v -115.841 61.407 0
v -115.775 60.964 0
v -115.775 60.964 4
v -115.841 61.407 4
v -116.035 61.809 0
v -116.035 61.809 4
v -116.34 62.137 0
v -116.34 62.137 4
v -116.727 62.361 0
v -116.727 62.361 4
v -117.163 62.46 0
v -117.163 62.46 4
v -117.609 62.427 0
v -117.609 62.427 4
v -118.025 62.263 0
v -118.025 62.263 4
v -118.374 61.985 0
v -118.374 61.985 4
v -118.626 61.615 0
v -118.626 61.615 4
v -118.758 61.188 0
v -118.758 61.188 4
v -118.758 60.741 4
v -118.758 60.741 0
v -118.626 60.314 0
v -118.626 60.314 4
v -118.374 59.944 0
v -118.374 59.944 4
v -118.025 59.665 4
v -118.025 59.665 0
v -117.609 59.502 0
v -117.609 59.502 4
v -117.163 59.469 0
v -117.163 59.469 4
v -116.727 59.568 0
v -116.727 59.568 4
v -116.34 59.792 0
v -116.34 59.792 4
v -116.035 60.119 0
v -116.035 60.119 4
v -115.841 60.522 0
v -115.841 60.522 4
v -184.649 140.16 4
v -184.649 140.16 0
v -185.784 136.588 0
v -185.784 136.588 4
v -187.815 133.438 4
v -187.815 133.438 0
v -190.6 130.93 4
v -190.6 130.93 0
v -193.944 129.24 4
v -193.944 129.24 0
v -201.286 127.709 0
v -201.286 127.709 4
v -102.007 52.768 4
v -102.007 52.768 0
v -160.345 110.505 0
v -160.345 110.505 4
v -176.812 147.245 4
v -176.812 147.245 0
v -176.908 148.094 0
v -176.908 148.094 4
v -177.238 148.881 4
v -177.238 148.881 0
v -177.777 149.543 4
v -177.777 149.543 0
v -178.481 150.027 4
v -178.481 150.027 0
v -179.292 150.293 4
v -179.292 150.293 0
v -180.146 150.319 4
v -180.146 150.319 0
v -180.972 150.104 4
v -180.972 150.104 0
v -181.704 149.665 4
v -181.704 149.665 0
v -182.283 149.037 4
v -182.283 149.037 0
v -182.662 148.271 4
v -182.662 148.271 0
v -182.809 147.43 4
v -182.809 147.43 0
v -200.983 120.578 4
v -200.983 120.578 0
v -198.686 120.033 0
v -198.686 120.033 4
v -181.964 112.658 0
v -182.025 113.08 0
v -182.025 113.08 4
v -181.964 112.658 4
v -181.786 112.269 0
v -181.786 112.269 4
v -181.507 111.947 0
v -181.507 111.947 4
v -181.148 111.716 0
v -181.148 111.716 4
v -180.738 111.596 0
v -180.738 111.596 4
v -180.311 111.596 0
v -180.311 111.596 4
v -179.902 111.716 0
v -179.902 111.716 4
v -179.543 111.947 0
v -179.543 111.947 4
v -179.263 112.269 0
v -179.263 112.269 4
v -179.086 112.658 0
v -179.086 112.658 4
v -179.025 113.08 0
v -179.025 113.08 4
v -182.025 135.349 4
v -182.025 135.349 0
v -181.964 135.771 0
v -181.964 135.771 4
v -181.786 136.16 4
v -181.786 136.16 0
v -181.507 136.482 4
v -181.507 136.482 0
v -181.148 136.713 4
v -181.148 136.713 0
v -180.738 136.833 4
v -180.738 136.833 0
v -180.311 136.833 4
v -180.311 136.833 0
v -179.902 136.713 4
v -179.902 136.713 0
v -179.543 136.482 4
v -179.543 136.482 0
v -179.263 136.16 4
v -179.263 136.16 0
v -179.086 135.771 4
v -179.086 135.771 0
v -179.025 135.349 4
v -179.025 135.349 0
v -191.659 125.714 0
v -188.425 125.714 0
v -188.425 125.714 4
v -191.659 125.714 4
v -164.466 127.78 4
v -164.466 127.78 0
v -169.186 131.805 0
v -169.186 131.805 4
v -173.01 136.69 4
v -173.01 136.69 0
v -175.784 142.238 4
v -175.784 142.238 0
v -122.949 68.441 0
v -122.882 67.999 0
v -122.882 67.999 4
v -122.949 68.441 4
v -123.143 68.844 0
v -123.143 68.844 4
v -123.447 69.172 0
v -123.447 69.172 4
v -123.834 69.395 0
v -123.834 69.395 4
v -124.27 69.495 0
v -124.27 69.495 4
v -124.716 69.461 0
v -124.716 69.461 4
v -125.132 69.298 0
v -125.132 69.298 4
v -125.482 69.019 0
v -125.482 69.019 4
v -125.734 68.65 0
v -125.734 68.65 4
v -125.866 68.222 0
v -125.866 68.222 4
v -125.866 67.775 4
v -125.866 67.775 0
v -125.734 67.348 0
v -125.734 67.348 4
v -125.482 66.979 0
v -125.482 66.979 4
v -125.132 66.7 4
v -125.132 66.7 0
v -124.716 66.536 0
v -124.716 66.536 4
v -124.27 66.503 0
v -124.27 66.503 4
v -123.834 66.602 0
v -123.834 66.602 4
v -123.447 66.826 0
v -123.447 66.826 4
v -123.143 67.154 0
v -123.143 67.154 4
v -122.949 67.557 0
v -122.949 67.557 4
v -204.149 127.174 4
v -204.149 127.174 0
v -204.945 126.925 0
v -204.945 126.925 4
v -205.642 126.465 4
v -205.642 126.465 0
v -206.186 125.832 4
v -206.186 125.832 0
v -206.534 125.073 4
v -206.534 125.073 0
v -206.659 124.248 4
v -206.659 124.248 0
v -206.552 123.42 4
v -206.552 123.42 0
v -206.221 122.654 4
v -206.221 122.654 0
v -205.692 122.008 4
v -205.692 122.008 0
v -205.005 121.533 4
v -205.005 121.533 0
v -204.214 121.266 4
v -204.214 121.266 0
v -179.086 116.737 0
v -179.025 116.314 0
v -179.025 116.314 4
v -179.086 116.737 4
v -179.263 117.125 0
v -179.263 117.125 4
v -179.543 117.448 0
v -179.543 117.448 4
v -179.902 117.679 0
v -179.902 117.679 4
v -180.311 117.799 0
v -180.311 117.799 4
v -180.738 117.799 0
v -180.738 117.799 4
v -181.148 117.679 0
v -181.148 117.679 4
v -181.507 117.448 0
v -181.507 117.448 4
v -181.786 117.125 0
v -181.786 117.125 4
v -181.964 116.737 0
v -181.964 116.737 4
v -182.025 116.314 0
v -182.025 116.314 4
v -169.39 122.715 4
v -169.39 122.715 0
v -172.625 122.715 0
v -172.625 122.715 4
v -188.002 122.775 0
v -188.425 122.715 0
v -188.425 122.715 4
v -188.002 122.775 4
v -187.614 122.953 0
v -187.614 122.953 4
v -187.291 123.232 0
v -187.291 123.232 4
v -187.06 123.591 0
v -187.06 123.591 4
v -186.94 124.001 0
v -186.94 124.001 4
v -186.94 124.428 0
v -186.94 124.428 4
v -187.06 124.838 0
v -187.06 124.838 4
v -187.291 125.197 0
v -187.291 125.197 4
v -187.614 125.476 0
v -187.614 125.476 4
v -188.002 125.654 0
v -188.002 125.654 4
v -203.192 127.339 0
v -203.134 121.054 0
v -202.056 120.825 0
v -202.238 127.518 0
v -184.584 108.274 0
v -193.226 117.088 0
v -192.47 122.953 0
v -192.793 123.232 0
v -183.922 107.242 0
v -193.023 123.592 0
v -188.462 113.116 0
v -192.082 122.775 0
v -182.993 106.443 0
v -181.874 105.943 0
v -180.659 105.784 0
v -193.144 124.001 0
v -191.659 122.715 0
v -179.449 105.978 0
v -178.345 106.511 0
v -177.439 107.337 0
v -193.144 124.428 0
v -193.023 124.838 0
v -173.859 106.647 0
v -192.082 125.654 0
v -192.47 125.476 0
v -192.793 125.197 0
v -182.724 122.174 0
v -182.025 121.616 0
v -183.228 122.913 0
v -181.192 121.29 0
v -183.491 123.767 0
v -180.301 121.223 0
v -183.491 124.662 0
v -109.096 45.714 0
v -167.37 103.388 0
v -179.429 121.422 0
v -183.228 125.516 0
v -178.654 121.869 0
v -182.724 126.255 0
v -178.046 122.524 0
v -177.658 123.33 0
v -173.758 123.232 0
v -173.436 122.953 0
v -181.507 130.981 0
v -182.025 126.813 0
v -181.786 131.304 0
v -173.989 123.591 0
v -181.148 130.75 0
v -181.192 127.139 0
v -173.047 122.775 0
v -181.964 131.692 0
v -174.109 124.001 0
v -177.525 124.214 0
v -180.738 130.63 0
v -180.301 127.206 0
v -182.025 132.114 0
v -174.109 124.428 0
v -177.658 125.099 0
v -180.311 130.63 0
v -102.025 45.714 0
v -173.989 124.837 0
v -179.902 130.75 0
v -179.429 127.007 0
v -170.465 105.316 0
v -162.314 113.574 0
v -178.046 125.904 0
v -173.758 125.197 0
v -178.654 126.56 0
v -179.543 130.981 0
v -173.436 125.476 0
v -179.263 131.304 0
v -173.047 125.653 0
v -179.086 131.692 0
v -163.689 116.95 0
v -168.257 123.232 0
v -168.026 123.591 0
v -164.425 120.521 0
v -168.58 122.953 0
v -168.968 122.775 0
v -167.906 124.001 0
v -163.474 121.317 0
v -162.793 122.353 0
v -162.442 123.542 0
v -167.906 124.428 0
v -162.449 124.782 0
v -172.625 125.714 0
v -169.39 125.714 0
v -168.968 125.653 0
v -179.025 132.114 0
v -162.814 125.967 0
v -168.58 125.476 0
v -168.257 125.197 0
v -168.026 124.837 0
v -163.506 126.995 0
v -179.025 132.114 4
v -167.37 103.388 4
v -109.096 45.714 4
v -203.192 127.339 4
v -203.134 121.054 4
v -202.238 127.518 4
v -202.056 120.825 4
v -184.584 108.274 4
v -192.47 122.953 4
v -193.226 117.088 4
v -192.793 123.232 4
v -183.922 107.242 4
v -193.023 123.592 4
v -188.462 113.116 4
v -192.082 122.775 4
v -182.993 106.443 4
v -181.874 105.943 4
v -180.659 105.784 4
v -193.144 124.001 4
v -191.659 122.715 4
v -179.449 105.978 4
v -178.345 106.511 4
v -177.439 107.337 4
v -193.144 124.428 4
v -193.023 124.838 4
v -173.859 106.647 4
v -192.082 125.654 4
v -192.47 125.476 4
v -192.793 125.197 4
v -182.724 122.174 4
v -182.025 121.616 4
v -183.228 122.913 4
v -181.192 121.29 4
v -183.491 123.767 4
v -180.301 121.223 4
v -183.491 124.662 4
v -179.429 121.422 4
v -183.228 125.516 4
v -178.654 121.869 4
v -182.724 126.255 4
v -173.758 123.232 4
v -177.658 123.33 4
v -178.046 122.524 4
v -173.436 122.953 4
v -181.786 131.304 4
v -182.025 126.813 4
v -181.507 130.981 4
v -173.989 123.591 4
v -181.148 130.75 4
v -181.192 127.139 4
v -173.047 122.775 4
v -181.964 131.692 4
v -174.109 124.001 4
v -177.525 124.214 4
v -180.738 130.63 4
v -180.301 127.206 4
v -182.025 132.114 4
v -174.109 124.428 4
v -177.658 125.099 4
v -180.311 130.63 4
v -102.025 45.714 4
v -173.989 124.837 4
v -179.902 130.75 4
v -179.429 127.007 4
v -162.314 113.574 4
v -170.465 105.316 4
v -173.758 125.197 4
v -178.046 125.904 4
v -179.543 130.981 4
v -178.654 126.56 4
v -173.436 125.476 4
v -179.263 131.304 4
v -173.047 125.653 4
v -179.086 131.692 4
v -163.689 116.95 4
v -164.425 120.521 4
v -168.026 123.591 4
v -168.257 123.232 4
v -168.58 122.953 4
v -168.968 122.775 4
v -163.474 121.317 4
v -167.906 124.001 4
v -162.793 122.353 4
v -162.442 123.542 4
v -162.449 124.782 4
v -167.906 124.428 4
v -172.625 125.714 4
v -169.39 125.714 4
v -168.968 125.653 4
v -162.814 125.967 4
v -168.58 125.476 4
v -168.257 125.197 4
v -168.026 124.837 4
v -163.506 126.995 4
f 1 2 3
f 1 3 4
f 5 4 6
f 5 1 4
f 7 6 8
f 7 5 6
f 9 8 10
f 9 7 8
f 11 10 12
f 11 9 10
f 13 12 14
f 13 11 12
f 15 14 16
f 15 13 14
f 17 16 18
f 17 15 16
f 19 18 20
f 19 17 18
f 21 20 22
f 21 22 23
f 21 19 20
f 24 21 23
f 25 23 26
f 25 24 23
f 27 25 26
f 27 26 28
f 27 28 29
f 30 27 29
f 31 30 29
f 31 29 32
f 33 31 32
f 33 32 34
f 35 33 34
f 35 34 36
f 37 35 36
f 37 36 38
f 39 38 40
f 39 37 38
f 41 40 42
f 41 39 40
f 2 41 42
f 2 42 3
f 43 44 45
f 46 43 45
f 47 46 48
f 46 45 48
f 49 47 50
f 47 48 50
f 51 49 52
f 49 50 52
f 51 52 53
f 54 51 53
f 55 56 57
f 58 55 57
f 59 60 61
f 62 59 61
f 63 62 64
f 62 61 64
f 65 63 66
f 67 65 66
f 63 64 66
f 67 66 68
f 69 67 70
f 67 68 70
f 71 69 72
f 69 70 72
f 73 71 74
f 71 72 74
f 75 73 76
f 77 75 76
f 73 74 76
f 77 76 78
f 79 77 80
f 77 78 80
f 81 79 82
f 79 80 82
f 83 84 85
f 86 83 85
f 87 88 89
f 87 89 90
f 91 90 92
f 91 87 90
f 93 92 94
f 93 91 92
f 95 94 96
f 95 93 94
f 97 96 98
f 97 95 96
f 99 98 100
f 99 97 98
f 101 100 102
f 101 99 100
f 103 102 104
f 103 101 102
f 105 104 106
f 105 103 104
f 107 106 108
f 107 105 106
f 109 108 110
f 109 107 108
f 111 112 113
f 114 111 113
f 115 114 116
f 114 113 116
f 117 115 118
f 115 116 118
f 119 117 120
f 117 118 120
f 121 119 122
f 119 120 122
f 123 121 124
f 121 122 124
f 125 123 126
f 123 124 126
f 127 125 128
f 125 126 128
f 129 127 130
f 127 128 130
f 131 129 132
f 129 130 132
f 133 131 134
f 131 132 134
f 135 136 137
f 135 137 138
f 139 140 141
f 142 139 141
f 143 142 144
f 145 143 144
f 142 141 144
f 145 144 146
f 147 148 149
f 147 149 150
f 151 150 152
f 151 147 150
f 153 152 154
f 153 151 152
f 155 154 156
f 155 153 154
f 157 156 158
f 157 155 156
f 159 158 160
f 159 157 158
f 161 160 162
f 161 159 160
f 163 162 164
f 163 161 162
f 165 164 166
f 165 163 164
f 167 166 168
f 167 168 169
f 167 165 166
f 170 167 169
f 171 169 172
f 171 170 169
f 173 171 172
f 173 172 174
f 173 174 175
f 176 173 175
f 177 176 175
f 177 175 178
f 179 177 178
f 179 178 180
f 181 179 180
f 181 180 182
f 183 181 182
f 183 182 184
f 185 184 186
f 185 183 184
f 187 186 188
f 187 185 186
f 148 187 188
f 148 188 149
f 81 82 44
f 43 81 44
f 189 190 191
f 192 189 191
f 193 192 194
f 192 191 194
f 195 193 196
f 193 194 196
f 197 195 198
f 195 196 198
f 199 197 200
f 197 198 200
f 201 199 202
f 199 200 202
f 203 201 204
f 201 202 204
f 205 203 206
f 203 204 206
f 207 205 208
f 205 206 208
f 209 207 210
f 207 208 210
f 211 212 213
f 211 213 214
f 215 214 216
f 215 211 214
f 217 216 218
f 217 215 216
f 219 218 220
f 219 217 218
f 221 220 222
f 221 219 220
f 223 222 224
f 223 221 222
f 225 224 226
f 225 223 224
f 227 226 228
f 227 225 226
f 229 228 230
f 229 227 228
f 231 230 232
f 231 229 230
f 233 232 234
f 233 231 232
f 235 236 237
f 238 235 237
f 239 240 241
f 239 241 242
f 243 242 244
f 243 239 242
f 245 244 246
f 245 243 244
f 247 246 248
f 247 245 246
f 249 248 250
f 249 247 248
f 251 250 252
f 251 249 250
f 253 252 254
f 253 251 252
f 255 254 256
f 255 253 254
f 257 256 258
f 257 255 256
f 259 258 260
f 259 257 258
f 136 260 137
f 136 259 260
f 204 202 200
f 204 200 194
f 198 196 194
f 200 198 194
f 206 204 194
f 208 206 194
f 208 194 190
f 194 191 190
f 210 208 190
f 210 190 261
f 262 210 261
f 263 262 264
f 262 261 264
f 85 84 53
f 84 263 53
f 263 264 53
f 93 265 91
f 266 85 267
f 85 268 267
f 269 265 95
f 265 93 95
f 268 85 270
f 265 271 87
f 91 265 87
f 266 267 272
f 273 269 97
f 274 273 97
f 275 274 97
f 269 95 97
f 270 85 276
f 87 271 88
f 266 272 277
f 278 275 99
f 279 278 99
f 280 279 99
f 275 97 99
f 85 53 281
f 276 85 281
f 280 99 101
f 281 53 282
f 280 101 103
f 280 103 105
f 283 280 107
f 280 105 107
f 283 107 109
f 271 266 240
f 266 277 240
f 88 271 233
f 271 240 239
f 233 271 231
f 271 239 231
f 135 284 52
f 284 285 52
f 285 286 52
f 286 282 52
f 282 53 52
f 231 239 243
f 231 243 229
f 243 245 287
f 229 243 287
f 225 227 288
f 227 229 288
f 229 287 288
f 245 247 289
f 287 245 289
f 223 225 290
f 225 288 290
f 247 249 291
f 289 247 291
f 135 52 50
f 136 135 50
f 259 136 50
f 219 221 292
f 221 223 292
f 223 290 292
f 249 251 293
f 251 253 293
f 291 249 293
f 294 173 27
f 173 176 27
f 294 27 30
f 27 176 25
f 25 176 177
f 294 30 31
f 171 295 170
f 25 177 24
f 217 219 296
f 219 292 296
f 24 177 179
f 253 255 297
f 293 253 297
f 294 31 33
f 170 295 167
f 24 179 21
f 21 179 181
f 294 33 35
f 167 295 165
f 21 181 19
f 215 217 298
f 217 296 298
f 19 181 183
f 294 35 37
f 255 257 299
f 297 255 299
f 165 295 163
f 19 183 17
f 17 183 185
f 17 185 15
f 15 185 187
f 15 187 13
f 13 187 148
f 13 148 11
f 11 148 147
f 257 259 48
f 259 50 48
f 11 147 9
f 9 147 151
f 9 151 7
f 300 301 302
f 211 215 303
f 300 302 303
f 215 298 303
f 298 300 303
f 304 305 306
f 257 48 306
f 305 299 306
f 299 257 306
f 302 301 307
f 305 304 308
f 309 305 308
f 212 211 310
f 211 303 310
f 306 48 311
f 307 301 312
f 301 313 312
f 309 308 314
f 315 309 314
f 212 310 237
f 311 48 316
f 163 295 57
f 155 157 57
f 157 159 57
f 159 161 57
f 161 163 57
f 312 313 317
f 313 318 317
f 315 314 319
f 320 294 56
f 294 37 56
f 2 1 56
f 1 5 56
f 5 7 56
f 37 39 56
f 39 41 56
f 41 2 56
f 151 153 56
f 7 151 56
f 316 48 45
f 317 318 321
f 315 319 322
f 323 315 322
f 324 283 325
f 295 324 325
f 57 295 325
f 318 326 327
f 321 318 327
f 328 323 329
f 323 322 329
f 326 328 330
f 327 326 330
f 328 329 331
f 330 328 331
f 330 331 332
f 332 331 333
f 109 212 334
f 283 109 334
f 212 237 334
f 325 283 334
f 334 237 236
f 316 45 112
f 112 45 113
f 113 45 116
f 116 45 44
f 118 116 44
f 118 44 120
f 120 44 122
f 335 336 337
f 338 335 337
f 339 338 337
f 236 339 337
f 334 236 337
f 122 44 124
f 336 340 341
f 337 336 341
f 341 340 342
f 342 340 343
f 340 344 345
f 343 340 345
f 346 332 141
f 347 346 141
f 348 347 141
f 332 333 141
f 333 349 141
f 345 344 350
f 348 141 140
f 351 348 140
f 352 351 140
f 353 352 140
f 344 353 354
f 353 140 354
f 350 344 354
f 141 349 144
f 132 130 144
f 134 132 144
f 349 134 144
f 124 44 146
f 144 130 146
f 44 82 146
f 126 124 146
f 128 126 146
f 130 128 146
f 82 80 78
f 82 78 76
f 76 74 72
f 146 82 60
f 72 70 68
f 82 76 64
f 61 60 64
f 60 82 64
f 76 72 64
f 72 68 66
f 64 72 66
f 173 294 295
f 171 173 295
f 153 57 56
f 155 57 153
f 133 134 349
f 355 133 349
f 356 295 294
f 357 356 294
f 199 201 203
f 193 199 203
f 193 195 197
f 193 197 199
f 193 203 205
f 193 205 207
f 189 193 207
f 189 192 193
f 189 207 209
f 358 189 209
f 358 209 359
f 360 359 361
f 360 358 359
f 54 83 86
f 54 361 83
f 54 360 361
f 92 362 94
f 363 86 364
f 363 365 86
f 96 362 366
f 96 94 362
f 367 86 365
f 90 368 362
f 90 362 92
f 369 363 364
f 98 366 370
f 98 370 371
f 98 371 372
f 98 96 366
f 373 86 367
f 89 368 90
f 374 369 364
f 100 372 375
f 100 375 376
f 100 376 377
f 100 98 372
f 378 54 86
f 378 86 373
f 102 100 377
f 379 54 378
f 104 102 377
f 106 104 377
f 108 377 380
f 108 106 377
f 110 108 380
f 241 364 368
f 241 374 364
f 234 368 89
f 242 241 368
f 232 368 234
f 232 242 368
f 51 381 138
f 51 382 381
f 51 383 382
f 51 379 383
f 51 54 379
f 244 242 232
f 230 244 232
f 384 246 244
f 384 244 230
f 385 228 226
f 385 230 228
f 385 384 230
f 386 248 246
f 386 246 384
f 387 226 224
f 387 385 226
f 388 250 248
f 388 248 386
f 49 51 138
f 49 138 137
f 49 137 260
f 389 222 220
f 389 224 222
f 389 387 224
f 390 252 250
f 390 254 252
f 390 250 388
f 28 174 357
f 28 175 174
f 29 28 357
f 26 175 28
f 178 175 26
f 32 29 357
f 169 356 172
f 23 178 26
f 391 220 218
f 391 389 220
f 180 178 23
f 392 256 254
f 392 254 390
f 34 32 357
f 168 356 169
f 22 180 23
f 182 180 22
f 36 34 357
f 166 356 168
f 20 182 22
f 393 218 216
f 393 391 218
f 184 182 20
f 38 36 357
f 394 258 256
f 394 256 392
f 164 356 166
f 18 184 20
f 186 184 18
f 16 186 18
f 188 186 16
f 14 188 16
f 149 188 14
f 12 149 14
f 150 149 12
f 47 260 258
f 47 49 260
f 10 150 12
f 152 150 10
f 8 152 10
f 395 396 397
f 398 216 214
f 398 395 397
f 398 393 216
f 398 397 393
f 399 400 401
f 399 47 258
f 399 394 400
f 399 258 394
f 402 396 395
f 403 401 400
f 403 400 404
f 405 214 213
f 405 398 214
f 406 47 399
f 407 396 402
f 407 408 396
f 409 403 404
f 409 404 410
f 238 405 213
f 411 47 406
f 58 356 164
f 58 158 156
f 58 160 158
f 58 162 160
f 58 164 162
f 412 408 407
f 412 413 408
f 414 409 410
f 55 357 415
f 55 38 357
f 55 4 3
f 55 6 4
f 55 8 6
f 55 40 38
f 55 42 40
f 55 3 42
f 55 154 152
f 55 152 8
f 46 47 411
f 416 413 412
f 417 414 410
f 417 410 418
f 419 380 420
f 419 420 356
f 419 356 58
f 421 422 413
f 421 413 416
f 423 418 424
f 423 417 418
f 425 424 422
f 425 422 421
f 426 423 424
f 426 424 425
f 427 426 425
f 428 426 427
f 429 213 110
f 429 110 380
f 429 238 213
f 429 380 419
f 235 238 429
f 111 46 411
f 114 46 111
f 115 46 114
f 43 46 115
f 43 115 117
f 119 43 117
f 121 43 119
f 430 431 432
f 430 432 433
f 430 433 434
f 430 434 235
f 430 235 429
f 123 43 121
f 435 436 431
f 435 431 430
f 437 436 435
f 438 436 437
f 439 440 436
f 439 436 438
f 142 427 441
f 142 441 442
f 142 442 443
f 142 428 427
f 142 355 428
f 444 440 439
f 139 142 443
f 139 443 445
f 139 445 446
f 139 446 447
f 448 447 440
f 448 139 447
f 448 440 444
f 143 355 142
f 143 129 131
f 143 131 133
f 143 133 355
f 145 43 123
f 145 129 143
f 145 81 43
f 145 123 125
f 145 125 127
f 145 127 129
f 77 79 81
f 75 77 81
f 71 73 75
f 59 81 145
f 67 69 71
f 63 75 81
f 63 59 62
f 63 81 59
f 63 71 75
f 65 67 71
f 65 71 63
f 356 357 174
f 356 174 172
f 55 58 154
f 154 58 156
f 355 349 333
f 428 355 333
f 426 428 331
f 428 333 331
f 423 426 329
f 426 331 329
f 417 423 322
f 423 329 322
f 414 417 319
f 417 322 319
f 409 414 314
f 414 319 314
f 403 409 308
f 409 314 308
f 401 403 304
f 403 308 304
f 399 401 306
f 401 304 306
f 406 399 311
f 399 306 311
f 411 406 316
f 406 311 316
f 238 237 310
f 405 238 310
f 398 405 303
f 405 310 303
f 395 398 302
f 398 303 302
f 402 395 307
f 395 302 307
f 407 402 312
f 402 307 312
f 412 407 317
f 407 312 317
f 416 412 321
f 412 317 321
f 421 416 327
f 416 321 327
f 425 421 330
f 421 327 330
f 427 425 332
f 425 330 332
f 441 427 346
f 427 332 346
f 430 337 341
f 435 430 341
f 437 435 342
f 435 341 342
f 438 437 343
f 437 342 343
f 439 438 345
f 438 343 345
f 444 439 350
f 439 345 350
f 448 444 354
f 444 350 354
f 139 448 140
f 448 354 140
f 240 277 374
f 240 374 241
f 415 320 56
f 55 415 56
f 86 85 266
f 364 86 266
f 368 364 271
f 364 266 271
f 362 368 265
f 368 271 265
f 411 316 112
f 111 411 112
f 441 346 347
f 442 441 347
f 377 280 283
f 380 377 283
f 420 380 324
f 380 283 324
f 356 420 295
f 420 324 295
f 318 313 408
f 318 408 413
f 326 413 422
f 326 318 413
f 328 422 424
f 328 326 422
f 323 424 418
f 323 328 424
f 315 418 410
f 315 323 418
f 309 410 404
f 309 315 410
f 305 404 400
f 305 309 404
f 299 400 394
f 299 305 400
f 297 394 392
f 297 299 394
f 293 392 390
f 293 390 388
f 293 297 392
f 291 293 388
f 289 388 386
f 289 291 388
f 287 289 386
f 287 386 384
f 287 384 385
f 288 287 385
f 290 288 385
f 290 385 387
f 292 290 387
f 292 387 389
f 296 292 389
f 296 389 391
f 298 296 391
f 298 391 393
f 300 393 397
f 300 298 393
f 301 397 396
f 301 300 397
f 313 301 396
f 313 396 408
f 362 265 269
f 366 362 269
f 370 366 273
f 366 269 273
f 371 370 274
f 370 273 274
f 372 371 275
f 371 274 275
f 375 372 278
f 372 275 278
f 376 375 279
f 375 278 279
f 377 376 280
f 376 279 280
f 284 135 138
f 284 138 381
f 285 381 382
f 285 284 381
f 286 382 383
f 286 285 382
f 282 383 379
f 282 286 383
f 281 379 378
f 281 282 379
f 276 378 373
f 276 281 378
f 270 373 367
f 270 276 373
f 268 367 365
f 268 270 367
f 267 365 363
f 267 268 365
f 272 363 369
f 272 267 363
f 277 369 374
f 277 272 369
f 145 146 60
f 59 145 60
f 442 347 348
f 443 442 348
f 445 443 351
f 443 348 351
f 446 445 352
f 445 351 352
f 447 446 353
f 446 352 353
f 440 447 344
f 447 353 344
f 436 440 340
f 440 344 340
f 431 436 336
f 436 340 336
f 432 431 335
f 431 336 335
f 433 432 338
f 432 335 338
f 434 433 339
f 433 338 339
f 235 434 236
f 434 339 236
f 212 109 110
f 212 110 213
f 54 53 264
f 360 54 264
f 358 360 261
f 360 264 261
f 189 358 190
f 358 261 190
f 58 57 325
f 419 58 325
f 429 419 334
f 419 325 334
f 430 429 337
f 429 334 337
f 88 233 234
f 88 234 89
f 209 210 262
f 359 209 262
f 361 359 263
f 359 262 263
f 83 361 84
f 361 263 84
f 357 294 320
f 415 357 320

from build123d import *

# Parameters (mm, degrees)
SKETCH1_R           = 1.5
SKETCH1_R_2         = 3
BOSS_EXTRUDE3_DEPTH = 4


with BuildPart() as part:
    # Sketch1 → Boss-Extrude3 (new body)
    with BuildSketch(Plane.XY):
        with BuildLine():
            Line((-200.98277671, 120.578395112), (-198.686273407, 120.032535791))
            ThreePointArc((-198.686273407, 120.032535791), (-190.744400987, 115.221467643), (-184.584385258, 108.273524028))
            ThreePointArc((-184.584385258, 108.273524028), (-181.272141891, 105.819229993), (-177.439106824, 107.336582128))
            ThreePointArc((-177.439106824, 107.336582128), (-172.13122346, 106.059599202), (-167.370398947, 103.387734467))
            Line((-167.370398947, 103.387734467), (-109.095690378, 45.714454225))
            Line((-109.095690378, 45.714454225), (-102.024771817, 45.714454225))
            Line((-102.024771817, 45.714454225), (-102.007026705, 52.767627674))
            Line((-102.007026705, 52.767627674), (-160.345422779, 110.504595422))
            ThreePointArc((-160.345422779, 110.504595422), (-163.078925024, 115.23029925), (-164.424771817, 120.521141112))
            ThreePointArc((-164.424771817, 120.521141112), (-162.39977496, 124.16226761), (-164.46612922, 127.780083873))
            ThreePointArc((-164.46612922, 127.780083873), (-171.220620663, 134.151626828), (-175.784254213, 142.238218389))
            Line((-175.784254213, 142.238218389), (-176.812194105, 147.245164825))
            ThreePointArc((-176.812194105, 147.245164825), (-179.718163472, 150.336336453), (-182.8093351, 147.430367085))
            Line((-182.8093351, 147.430367085), (-184.649305769, 140.159568784))
            ThreePointArc((-184.649305769, 140.159568784), (-187.814666362, 133.438140211), (-193.944387613, 129.240089815))
            Line((-193.944387613, 129.240089815), (-201.286490927, 127.709234194))
            ThreePointArc((-201.286490927, 127.709234194), (-202.714852362, 127.426883631), (-204.148777392, 127.174302472))
            ThreePointArc((-204.148777392, 127.174302472), (-206.658919771, 124.247833074), (-204.214354736, 121.266367045))
            ThreePointArc((-204.214354736, 121.266367045), (-202.594506126, 120.941450032), (-200.98277671, 120.578395112))
        make_face()
        with Locations((-117.274771817, 60.964454225)):
            Circle(SKETCH1_R, mode=Mode.SUBTRACT)
        with Locations((-180.524771817, 124.214454225)):
            Circle(SKETCH1_R_2, mode=Mode.SUBTRACT)
        with Locations((-124.382381975, 67.998789861)):
            Circle(SKETCH1_R, mode=Mode.SUBTRACT)
        with BuildLine():
            Line((-182.024547822, 132.114454225), (-182.024547822, 135.348786972))
            ThreePointArc((-182.024547822, 135.348786972), (-180.524727129, 136.848607665), (-179.024906436, 135.348786972))
            Line((-179.024906436, 135.348786972), (-179.024906436, 132.114454225))
            ThreePointArc((-179.024906436, 132.114454225), (-180.524727129, 130.614633532), (-182.024547822, 132.114454225))
        make_face(mode=Mode.SUBTRACT)
        with BuildLine():
            Line((-182.024547822, 116.314454225), (-182.024547822, 113.080121478))
            ThreePointArc((-182.024547822, 113.080121478), (-180.524727129, 111.580300785), (-179.024906436, 113.080121478))
            Line((-179.024906436, 113.080121478), (-179.024906436, 116.314454225))
            ThreePointArc((-179.024906436, 116.314454225), (-180.524727129, 117.814274918), (-182.024547822, 116.314454225))
        make_face(mode=Mode.SUBTRACT)
        with BuildLine():
            Line((-172.624771818, 125.71423023), (-169.39043907, 125.71423023))
            ThreePointArc((-169.39043907, 125.71423023), (-167.890618373, 124.214409533), (-169.39043907, 122.714588836))
            Line((-169.39043907, 122.714588836), (-172.624771818, 122.714588836))
            ThreePointArc((-172.624771818, 122.714588836), (-174.124592515, 124.214409533), (-172.624771818, 125.71423023))
        make_face(mode=Mode.SUBTRACT)
        with BuildLine():
            Line((-188.424754849, 125.714319606), (-191.659087596, 125.714356198))
            ThreePointArc((-191.659087596, 125.714356198), (-193.158925261, 124.214552469), (-191.659121532, 122.714714804))
            Line((-191.659121532, 122.714714804), (-188.424788785, 122.714678212))
            ThreePointArc((-188.424788785, 122.714678212), (-186.92495112, 124.214481941), (-188.424754849, 125.714319606))
        make_face(mode=Mode.SUBTRACT)
    extrude(amount=BOSS_EXTRUDE3_DEPTH)


solid = part.part
